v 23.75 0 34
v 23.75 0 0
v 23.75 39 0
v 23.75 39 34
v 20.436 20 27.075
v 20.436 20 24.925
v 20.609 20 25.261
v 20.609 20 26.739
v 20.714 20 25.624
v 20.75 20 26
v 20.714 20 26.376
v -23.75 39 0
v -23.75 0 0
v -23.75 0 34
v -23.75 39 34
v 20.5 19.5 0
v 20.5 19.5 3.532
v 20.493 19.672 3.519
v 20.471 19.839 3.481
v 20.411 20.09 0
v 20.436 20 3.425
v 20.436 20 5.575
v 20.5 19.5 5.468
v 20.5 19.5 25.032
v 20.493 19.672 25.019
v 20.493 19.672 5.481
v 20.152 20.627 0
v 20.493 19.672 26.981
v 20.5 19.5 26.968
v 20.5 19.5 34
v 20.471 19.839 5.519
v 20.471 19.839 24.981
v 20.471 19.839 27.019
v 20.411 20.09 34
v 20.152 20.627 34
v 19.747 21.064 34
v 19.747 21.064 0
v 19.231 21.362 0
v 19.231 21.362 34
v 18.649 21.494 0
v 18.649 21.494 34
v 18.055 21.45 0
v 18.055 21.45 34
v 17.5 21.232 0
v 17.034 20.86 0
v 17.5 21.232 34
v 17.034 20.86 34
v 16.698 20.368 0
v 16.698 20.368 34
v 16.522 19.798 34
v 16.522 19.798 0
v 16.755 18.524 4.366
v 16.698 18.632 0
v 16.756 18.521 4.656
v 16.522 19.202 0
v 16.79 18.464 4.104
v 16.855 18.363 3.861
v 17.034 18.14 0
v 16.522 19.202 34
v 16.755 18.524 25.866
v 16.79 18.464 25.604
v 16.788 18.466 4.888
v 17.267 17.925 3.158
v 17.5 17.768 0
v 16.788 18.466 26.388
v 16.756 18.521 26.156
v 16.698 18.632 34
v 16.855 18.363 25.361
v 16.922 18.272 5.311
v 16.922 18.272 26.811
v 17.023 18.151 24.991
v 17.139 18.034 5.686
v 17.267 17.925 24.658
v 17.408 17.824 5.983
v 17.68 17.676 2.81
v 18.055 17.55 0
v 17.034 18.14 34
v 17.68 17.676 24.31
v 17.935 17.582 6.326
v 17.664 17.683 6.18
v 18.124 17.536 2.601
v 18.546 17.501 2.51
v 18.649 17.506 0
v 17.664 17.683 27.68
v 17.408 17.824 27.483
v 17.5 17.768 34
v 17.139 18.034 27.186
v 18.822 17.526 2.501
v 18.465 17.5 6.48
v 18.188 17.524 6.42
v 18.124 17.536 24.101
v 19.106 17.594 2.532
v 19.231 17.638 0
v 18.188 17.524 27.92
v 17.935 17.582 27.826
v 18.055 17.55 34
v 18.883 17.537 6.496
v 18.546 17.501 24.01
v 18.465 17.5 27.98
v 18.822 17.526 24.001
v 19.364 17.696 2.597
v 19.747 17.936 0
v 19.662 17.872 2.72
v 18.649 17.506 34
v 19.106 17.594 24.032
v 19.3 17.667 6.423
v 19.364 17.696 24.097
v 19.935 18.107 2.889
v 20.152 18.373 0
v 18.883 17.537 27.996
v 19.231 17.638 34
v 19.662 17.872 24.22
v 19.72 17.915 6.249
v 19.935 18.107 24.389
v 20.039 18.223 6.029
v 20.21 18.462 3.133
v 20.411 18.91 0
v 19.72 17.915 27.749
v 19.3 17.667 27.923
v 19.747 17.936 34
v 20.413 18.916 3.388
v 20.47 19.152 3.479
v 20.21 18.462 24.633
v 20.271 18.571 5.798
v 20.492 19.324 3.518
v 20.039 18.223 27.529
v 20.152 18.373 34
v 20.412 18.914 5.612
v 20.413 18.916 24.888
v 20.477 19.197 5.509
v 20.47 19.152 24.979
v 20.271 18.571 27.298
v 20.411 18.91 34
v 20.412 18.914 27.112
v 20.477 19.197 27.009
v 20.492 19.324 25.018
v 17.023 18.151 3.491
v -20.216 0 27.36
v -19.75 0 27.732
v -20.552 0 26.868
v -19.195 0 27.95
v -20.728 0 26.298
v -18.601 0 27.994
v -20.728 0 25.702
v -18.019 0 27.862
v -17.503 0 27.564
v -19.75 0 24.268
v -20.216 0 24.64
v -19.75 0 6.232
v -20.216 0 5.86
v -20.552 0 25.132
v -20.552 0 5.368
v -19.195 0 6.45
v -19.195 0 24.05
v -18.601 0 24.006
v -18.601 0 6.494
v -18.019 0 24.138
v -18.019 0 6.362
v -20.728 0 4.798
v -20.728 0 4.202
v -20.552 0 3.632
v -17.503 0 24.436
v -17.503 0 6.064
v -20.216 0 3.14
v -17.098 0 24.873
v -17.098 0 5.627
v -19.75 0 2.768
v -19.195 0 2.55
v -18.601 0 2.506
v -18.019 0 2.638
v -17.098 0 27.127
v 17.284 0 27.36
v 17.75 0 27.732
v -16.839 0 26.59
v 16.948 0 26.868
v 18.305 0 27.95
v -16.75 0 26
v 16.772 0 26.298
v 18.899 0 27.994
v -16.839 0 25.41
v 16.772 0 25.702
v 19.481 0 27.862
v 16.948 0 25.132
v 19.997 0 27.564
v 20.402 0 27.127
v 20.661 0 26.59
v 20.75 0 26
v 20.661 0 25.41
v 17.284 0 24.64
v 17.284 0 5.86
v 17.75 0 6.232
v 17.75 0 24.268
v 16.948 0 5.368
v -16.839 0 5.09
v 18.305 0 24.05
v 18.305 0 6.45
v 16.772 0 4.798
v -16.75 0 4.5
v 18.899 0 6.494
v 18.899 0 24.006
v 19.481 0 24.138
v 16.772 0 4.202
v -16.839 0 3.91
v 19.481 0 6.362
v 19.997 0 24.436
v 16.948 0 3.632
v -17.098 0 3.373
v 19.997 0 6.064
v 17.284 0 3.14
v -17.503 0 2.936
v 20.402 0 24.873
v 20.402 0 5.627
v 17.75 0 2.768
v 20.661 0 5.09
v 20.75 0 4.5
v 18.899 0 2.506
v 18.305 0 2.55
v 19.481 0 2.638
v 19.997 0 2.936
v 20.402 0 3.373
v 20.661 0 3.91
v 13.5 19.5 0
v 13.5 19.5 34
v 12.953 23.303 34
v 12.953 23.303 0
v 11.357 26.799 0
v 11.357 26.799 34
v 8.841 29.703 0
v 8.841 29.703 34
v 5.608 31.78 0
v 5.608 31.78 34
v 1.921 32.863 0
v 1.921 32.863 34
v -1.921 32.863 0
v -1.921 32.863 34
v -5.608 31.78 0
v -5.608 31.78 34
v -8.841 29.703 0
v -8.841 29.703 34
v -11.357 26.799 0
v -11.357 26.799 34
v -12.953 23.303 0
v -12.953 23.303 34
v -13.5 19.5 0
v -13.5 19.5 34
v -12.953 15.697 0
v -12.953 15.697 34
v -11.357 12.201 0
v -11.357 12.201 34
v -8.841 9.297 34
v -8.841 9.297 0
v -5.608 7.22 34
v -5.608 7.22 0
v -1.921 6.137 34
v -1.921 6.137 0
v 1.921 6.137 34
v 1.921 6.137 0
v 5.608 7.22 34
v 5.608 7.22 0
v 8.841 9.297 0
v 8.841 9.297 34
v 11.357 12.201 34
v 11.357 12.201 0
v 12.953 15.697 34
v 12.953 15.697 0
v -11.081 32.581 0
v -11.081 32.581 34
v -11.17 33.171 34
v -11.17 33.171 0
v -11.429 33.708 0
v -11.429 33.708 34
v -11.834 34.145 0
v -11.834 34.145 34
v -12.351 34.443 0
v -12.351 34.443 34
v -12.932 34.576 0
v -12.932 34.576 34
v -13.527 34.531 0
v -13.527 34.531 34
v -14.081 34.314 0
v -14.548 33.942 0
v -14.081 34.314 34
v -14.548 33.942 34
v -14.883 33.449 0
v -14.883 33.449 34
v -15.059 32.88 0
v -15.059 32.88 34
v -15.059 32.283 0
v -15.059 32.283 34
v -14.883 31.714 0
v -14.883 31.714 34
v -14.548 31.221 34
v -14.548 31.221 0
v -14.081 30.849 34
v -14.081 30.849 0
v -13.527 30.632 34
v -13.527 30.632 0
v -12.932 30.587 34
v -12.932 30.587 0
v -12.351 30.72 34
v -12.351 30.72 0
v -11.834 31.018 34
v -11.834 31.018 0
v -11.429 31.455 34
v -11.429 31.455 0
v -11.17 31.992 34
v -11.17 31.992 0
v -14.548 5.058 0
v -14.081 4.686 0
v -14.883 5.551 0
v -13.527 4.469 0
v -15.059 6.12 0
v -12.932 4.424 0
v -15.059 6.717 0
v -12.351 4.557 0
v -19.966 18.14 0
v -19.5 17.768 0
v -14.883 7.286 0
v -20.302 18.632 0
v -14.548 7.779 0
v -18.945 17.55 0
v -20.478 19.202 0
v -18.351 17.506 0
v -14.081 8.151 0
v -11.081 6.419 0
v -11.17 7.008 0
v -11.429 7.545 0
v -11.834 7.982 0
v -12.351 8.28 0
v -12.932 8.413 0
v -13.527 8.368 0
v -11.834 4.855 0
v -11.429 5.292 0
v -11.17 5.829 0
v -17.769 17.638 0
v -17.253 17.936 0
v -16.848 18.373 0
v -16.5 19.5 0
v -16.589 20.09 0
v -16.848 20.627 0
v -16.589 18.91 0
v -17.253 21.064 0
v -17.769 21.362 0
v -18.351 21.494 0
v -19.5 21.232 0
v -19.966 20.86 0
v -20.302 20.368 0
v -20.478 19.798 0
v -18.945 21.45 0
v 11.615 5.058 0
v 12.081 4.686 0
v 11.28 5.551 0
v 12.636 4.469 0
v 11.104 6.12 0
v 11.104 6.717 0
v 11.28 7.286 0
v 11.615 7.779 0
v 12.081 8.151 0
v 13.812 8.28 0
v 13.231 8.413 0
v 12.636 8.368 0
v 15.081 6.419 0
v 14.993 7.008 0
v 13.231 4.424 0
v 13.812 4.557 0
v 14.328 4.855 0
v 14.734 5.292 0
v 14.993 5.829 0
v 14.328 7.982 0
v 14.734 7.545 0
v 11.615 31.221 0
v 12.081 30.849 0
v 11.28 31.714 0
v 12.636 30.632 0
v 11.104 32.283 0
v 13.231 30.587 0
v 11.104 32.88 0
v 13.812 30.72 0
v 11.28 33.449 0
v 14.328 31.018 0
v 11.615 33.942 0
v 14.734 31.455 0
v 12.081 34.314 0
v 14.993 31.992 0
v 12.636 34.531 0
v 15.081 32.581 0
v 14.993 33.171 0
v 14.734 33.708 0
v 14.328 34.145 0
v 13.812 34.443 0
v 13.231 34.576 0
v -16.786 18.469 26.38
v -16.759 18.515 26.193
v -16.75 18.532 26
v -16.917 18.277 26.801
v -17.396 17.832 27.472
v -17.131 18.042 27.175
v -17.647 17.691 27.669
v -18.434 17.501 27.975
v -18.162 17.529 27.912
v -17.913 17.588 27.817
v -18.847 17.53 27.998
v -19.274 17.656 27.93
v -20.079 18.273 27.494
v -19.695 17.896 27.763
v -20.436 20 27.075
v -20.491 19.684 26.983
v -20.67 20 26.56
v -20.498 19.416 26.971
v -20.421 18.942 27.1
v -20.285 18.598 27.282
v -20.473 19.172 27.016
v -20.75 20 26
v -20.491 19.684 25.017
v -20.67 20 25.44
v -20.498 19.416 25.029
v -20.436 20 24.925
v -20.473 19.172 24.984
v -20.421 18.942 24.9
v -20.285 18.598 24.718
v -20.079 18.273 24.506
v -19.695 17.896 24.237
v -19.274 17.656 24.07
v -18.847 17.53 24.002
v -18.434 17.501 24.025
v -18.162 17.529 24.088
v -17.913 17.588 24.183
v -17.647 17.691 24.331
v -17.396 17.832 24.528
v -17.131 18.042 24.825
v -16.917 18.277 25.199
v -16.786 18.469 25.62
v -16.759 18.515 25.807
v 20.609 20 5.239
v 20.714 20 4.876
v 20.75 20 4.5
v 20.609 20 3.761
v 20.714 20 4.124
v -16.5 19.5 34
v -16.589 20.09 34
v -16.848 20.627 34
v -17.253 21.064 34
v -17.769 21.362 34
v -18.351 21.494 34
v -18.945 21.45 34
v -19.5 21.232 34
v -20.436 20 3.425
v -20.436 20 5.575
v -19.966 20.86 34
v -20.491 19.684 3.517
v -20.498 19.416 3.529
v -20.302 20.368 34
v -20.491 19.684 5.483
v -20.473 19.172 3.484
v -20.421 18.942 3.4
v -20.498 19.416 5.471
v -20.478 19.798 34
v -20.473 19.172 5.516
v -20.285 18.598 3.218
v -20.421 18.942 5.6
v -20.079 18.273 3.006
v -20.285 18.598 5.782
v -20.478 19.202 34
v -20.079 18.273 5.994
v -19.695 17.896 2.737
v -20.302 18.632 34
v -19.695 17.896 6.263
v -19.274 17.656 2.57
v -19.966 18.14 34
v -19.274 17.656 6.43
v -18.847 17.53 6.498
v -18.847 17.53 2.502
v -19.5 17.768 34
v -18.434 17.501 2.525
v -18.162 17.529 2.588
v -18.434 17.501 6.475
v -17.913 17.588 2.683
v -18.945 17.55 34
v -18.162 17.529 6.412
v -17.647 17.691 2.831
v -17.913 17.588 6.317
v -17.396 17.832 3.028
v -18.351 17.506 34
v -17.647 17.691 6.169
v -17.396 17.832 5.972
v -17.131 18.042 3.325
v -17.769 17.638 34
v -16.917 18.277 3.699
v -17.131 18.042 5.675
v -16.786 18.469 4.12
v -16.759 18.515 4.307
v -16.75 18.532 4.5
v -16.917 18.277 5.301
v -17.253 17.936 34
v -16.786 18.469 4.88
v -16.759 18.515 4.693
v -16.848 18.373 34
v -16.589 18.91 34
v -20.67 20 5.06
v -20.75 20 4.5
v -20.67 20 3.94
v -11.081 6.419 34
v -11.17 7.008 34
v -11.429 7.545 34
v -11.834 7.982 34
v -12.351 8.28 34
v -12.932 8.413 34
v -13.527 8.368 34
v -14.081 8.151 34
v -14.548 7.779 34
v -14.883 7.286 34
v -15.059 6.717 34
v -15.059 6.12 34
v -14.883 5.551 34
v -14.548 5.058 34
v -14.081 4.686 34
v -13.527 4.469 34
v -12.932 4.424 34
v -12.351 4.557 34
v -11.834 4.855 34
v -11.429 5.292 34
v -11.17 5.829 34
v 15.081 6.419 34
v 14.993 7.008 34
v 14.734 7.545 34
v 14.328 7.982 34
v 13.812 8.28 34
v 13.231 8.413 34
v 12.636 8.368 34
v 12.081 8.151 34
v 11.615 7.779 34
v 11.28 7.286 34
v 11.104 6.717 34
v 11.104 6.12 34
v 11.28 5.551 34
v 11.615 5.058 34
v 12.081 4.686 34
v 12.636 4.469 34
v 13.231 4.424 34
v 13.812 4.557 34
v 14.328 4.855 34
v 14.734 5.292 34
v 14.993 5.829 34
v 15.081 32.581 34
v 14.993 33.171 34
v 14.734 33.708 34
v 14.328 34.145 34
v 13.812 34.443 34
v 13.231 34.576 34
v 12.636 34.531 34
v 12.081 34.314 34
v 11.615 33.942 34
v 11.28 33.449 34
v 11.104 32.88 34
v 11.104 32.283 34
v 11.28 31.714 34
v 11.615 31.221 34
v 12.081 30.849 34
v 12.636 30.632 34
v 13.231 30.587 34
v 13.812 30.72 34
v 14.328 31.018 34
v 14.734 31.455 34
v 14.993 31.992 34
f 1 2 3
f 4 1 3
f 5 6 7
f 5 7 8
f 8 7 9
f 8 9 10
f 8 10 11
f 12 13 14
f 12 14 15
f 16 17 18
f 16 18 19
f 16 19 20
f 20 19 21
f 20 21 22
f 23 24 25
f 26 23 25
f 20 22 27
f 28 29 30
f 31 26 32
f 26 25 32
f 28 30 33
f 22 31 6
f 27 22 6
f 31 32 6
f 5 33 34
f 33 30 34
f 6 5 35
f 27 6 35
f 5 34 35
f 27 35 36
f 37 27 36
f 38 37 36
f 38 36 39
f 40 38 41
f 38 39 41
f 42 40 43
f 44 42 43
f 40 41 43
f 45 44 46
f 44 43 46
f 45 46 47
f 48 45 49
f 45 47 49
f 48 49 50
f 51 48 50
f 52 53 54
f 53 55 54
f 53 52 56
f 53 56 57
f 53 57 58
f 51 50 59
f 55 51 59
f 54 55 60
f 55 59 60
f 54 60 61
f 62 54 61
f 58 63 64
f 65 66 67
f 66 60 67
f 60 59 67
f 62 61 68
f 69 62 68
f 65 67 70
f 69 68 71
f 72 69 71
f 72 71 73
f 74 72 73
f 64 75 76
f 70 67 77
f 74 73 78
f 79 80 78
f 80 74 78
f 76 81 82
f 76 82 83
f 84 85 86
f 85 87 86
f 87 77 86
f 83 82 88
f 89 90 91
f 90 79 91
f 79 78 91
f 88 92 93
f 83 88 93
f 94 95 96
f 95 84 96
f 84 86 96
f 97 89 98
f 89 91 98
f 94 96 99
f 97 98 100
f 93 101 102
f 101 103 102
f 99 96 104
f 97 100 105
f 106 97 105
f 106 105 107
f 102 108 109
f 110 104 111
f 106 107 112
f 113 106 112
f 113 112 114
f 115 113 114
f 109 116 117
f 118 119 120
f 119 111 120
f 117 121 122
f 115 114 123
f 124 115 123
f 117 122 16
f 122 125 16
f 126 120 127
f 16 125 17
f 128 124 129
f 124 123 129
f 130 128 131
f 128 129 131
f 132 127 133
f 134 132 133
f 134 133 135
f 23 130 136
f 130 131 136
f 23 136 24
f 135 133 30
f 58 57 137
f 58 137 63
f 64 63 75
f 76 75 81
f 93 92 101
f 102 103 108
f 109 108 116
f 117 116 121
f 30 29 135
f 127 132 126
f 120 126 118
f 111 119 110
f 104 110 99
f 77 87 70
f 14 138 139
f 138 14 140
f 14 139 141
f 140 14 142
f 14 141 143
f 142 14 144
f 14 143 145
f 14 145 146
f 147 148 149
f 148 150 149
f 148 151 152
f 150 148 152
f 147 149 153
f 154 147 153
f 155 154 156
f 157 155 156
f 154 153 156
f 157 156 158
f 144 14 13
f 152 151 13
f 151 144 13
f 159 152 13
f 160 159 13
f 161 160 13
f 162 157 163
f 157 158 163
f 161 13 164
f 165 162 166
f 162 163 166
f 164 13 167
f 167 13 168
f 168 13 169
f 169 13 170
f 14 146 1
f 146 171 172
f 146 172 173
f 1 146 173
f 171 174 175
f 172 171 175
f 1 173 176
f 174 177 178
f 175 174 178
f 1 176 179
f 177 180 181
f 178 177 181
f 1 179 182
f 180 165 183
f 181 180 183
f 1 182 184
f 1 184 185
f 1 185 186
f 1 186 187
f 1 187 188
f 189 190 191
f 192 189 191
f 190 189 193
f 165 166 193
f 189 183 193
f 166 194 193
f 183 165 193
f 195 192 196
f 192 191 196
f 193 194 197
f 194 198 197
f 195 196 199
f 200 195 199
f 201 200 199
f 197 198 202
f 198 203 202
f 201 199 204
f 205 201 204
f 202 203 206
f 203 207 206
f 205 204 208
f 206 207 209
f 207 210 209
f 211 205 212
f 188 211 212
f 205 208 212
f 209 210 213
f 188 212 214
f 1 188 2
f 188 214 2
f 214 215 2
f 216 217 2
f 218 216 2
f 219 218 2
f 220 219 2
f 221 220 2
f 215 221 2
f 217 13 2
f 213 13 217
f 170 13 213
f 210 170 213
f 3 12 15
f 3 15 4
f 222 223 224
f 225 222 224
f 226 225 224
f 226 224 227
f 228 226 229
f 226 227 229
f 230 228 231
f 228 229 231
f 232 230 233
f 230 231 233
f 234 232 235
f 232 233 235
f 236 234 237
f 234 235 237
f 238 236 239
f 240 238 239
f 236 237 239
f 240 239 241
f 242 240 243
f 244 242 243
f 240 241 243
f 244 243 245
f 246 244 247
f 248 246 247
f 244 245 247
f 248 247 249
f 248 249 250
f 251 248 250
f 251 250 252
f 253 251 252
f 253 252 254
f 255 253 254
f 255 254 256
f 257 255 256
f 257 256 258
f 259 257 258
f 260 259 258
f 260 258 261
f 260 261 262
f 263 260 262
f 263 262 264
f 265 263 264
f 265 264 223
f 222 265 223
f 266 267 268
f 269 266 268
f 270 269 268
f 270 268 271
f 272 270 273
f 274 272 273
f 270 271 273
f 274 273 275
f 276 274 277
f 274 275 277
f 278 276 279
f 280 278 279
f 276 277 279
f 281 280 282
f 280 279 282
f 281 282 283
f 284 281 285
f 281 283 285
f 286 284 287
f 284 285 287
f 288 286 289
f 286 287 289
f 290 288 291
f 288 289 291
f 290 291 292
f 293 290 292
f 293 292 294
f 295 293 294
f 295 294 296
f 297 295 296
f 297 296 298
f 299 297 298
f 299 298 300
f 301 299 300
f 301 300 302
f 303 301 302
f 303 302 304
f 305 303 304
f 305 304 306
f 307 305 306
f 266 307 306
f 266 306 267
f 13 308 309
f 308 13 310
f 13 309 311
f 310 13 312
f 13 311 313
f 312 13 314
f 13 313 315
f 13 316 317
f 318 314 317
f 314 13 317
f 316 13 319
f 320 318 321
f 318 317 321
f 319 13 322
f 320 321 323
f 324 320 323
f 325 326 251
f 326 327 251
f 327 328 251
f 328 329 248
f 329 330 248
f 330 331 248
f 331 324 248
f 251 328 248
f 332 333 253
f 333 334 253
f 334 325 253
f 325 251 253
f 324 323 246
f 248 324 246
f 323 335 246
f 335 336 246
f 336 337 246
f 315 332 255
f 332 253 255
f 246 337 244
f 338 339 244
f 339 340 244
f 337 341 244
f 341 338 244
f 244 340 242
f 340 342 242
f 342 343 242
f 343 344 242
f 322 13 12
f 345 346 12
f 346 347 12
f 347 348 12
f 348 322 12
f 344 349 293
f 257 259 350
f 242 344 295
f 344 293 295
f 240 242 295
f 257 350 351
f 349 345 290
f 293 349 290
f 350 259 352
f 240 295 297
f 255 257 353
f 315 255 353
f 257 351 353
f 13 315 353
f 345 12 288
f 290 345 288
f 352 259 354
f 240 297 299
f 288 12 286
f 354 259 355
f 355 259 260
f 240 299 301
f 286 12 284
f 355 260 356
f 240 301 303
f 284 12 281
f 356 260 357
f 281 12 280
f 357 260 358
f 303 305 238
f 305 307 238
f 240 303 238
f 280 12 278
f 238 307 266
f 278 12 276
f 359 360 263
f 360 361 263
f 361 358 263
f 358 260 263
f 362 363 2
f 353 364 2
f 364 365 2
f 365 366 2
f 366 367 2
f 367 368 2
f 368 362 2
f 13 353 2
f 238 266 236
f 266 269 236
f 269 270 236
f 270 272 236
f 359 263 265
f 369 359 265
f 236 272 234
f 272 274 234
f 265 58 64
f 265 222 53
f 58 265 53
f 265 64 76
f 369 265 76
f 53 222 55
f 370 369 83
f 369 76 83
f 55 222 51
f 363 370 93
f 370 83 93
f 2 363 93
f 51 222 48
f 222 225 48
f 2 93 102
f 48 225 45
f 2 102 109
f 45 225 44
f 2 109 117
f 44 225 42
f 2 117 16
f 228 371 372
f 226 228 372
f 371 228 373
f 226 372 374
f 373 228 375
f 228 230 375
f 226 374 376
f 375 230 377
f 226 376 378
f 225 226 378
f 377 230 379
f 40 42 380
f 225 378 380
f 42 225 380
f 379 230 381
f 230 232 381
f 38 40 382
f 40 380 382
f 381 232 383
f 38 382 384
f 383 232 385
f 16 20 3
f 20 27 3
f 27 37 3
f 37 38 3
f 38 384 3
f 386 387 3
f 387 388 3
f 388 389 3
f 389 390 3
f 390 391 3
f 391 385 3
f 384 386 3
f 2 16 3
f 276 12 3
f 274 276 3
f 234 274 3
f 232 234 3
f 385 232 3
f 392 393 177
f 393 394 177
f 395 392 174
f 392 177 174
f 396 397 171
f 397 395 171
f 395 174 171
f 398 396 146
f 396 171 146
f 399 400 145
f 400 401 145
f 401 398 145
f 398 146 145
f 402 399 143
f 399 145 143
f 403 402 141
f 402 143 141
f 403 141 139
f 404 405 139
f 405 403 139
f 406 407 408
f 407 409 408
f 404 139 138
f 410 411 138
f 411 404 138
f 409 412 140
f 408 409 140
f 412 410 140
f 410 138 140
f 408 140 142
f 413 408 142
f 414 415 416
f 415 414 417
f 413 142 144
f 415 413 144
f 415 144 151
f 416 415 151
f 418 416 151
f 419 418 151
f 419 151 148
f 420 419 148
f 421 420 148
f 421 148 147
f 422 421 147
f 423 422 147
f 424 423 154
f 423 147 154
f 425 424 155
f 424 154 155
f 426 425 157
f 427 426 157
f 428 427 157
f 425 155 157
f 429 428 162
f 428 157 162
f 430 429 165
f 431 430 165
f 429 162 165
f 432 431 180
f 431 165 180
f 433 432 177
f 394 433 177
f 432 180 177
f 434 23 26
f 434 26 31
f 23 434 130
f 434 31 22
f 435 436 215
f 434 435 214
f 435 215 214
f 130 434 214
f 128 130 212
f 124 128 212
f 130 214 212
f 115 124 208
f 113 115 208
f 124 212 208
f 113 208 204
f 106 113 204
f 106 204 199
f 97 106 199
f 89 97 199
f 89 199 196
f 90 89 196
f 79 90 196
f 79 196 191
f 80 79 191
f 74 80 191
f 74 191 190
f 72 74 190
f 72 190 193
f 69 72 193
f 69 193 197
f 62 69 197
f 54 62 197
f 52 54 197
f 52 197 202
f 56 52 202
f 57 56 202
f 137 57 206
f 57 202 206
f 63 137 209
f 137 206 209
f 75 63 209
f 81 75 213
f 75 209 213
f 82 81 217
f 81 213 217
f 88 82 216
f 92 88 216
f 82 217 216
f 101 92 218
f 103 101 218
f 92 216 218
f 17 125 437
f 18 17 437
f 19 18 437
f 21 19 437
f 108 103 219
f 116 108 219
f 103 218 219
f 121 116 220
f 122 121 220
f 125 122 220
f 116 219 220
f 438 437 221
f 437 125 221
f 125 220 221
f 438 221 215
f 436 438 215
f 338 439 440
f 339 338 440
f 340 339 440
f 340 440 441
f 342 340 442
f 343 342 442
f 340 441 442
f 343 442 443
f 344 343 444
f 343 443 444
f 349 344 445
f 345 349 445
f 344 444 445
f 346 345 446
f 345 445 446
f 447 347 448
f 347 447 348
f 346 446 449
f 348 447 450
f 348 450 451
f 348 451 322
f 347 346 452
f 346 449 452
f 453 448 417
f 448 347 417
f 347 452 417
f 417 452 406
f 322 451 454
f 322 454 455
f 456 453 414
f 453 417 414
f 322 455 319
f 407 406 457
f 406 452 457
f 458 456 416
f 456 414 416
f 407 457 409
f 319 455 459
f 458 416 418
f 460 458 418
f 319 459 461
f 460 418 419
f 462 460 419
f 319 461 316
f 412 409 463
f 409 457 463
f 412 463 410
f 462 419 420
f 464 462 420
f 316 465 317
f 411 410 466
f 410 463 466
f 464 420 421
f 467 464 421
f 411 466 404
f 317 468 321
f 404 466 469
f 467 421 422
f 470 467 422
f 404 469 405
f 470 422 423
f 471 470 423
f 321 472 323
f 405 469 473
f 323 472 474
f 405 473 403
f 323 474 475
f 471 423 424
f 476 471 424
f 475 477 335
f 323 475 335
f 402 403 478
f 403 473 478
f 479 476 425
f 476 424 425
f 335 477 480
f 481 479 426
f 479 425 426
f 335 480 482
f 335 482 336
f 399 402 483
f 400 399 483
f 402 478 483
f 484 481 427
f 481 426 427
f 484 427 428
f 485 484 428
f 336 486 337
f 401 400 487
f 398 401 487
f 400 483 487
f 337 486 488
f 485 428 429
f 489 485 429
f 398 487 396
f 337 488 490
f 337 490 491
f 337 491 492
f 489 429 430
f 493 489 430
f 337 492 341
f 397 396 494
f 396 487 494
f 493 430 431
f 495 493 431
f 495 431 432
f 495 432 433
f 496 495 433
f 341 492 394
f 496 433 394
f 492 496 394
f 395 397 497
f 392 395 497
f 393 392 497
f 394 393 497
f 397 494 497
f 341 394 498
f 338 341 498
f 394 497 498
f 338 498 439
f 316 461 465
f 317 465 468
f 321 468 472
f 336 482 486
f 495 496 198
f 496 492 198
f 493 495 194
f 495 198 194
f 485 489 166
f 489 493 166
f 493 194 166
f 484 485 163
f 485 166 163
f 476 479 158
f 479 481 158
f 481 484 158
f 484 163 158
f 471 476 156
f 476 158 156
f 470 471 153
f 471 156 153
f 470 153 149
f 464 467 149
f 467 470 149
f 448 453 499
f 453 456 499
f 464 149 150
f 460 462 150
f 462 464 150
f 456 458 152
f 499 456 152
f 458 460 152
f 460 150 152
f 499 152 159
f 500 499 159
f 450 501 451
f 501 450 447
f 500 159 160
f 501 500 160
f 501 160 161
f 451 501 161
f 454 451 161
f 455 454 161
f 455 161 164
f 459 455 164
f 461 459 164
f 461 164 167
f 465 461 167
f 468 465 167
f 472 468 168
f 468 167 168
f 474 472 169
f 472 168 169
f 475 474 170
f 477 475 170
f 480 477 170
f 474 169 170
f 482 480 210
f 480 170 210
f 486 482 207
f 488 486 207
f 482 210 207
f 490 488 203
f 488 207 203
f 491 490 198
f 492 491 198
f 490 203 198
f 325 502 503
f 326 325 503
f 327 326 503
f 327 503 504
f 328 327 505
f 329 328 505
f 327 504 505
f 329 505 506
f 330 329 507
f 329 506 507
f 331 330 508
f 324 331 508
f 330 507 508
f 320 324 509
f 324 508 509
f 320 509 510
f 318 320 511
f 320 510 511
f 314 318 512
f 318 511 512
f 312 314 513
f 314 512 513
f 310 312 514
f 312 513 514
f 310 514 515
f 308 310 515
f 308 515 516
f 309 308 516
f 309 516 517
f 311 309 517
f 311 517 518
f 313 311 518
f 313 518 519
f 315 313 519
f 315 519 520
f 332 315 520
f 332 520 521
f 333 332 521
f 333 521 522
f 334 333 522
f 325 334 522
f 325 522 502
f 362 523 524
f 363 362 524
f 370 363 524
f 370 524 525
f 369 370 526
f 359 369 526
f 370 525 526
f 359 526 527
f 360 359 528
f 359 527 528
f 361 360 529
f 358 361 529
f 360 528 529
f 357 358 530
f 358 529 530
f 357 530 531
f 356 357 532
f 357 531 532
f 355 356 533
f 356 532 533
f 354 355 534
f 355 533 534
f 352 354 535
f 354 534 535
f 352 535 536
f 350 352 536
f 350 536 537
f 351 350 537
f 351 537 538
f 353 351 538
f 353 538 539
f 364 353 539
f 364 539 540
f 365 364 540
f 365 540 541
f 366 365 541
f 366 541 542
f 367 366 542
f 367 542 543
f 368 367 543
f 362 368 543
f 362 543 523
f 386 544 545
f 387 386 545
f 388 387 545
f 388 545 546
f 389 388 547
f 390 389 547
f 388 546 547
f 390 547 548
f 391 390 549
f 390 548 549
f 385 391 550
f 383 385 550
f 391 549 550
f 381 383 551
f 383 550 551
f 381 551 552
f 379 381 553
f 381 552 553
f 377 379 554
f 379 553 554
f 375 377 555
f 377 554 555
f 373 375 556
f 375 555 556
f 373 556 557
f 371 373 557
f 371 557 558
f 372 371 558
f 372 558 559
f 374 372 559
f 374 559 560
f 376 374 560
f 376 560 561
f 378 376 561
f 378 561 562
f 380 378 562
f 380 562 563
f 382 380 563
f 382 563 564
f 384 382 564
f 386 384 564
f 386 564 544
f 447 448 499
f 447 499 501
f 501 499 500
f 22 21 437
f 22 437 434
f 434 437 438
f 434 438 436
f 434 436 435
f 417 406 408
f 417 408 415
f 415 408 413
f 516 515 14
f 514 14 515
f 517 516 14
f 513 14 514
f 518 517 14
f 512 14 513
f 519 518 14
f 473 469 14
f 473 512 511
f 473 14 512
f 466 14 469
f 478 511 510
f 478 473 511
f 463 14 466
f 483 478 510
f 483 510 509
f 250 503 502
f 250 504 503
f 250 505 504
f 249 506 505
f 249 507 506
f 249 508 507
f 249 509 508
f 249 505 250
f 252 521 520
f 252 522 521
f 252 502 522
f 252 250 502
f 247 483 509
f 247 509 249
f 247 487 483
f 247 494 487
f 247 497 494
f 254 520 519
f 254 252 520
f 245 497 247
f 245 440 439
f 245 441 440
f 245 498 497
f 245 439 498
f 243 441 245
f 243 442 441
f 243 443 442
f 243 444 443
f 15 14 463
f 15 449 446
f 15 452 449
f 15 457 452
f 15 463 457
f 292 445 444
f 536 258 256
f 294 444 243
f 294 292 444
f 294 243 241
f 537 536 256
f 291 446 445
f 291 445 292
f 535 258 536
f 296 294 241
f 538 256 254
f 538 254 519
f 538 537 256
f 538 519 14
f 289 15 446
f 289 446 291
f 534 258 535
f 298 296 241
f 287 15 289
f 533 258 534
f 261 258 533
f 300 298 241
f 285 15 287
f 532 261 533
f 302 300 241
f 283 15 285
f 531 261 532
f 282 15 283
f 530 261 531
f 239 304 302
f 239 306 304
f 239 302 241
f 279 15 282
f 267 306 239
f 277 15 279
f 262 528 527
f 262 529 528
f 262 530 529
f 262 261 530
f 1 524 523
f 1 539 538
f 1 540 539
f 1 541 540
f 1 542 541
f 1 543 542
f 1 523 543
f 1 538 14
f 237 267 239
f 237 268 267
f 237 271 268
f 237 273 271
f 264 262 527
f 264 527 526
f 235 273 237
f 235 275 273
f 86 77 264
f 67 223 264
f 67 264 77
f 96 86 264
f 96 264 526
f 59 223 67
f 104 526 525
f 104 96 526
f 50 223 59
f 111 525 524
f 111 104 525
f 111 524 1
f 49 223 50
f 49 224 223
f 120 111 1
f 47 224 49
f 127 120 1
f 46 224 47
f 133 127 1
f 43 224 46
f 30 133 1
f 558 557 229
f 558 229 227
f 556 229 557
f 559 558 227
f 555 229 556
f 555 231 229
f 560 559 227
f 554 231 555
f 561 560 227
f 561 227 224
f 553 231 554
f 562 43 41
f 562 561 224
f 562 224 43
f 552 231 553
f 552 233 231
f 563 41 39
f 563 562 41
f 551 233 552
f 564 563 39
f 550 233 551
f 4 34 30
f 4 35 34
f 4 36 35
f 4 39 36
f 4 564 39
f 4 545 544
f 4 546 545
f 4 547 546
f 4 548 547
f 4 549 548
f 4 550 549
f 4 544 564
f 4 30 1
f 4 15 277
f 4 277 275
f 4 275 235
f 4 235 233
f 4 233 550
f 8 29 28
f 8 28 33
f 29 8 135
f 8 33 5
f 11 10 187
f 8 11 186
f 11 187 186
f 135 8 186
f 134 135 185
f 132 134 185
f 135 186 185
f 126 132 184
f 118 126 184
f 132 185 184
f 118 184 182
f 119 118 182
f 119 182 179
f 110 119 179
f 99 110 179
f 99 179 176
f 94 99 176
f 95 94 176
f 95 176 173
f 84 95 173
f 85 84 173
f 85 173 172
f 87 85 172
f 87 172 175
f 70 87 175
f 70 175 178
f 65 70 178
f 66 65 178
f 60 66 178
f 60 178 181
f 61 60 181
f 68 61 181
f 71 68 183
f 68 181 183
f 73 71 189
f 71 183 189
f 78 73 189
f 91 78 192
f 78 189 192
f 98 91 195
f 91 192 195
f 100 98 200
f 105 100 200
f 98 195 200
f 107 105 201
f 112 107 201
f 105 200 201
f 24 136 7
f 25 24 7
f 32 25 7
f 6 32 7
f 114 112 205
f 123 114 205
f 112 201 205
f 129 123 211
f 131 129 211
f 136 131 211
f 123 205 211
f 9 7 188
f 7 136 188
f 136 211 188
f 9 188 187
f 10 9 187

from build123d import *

# Parameters (mm, degrees)
SKETCH_W        = 47.5
SKETCH_H        = 39
PAD_DEPTH       = 34
SKETCH001_R     = 13.5
SKETCH001_R_2   = 2
POCKET_DEPTH    = 40
SKETCH002_R     = 2
POCKET001_DEPTH = 20


with BuildPart() as part:
    # Sketch → Pad (new body)
    with BuildSketch(Plane.XY):
        with Locations((0, 19.5)):
            Rectangle(SKETCH_W, SKETCH_H)
    extrude(amount=PAD_DEPTH)

    # Sketch001 → Pocket (cut)
    with BuildSketch(Plane.XY.offset(34)):
        with Locations((0, 19.5)):
            Circle(SKETCH001_R)
        with Locations((-18.5, 19.5)):
            Circle(SKETCH001_R_2)
        with Locations((18.5, 19.5)):
            Circle(SKETCH001_R_2)
        with Locations((13.081476, 6.418525)):
            Circle(SKETCH001_R_2)
        with Locations((13.081476, 32.581475)):
            Circle(SKETCH001_R_2)
        with Locations((-13.081476, 6.418525)):
            Circle(SKETCH001_R_2)
        with Locations((-13.081476, 32.581475)):
            Circle(SKETCH001_R_2)
    extrude(amount=-POCKET_DEPTH, mode=Mode.SUBTRACT)

    # Sketch002 → Pocket001 (cut)
    with BuildSketch(Plane.XZ):
        with Locations((18.75, 4.5)):
            Circle(SKETCH002_R)
        with Locations((-18.75, 4.5)):
            Circle(SKETCH002_R)
        with Locations((18.75, 26)):
            Circle(SKETCH002_R)
        with Locations((-18.75, 26)):
            Circle(SKETCH002_R)
    extrude(amount=-POCKET001_DEPTH, mode=Mode.SUBTRACT)


solid = part.part
